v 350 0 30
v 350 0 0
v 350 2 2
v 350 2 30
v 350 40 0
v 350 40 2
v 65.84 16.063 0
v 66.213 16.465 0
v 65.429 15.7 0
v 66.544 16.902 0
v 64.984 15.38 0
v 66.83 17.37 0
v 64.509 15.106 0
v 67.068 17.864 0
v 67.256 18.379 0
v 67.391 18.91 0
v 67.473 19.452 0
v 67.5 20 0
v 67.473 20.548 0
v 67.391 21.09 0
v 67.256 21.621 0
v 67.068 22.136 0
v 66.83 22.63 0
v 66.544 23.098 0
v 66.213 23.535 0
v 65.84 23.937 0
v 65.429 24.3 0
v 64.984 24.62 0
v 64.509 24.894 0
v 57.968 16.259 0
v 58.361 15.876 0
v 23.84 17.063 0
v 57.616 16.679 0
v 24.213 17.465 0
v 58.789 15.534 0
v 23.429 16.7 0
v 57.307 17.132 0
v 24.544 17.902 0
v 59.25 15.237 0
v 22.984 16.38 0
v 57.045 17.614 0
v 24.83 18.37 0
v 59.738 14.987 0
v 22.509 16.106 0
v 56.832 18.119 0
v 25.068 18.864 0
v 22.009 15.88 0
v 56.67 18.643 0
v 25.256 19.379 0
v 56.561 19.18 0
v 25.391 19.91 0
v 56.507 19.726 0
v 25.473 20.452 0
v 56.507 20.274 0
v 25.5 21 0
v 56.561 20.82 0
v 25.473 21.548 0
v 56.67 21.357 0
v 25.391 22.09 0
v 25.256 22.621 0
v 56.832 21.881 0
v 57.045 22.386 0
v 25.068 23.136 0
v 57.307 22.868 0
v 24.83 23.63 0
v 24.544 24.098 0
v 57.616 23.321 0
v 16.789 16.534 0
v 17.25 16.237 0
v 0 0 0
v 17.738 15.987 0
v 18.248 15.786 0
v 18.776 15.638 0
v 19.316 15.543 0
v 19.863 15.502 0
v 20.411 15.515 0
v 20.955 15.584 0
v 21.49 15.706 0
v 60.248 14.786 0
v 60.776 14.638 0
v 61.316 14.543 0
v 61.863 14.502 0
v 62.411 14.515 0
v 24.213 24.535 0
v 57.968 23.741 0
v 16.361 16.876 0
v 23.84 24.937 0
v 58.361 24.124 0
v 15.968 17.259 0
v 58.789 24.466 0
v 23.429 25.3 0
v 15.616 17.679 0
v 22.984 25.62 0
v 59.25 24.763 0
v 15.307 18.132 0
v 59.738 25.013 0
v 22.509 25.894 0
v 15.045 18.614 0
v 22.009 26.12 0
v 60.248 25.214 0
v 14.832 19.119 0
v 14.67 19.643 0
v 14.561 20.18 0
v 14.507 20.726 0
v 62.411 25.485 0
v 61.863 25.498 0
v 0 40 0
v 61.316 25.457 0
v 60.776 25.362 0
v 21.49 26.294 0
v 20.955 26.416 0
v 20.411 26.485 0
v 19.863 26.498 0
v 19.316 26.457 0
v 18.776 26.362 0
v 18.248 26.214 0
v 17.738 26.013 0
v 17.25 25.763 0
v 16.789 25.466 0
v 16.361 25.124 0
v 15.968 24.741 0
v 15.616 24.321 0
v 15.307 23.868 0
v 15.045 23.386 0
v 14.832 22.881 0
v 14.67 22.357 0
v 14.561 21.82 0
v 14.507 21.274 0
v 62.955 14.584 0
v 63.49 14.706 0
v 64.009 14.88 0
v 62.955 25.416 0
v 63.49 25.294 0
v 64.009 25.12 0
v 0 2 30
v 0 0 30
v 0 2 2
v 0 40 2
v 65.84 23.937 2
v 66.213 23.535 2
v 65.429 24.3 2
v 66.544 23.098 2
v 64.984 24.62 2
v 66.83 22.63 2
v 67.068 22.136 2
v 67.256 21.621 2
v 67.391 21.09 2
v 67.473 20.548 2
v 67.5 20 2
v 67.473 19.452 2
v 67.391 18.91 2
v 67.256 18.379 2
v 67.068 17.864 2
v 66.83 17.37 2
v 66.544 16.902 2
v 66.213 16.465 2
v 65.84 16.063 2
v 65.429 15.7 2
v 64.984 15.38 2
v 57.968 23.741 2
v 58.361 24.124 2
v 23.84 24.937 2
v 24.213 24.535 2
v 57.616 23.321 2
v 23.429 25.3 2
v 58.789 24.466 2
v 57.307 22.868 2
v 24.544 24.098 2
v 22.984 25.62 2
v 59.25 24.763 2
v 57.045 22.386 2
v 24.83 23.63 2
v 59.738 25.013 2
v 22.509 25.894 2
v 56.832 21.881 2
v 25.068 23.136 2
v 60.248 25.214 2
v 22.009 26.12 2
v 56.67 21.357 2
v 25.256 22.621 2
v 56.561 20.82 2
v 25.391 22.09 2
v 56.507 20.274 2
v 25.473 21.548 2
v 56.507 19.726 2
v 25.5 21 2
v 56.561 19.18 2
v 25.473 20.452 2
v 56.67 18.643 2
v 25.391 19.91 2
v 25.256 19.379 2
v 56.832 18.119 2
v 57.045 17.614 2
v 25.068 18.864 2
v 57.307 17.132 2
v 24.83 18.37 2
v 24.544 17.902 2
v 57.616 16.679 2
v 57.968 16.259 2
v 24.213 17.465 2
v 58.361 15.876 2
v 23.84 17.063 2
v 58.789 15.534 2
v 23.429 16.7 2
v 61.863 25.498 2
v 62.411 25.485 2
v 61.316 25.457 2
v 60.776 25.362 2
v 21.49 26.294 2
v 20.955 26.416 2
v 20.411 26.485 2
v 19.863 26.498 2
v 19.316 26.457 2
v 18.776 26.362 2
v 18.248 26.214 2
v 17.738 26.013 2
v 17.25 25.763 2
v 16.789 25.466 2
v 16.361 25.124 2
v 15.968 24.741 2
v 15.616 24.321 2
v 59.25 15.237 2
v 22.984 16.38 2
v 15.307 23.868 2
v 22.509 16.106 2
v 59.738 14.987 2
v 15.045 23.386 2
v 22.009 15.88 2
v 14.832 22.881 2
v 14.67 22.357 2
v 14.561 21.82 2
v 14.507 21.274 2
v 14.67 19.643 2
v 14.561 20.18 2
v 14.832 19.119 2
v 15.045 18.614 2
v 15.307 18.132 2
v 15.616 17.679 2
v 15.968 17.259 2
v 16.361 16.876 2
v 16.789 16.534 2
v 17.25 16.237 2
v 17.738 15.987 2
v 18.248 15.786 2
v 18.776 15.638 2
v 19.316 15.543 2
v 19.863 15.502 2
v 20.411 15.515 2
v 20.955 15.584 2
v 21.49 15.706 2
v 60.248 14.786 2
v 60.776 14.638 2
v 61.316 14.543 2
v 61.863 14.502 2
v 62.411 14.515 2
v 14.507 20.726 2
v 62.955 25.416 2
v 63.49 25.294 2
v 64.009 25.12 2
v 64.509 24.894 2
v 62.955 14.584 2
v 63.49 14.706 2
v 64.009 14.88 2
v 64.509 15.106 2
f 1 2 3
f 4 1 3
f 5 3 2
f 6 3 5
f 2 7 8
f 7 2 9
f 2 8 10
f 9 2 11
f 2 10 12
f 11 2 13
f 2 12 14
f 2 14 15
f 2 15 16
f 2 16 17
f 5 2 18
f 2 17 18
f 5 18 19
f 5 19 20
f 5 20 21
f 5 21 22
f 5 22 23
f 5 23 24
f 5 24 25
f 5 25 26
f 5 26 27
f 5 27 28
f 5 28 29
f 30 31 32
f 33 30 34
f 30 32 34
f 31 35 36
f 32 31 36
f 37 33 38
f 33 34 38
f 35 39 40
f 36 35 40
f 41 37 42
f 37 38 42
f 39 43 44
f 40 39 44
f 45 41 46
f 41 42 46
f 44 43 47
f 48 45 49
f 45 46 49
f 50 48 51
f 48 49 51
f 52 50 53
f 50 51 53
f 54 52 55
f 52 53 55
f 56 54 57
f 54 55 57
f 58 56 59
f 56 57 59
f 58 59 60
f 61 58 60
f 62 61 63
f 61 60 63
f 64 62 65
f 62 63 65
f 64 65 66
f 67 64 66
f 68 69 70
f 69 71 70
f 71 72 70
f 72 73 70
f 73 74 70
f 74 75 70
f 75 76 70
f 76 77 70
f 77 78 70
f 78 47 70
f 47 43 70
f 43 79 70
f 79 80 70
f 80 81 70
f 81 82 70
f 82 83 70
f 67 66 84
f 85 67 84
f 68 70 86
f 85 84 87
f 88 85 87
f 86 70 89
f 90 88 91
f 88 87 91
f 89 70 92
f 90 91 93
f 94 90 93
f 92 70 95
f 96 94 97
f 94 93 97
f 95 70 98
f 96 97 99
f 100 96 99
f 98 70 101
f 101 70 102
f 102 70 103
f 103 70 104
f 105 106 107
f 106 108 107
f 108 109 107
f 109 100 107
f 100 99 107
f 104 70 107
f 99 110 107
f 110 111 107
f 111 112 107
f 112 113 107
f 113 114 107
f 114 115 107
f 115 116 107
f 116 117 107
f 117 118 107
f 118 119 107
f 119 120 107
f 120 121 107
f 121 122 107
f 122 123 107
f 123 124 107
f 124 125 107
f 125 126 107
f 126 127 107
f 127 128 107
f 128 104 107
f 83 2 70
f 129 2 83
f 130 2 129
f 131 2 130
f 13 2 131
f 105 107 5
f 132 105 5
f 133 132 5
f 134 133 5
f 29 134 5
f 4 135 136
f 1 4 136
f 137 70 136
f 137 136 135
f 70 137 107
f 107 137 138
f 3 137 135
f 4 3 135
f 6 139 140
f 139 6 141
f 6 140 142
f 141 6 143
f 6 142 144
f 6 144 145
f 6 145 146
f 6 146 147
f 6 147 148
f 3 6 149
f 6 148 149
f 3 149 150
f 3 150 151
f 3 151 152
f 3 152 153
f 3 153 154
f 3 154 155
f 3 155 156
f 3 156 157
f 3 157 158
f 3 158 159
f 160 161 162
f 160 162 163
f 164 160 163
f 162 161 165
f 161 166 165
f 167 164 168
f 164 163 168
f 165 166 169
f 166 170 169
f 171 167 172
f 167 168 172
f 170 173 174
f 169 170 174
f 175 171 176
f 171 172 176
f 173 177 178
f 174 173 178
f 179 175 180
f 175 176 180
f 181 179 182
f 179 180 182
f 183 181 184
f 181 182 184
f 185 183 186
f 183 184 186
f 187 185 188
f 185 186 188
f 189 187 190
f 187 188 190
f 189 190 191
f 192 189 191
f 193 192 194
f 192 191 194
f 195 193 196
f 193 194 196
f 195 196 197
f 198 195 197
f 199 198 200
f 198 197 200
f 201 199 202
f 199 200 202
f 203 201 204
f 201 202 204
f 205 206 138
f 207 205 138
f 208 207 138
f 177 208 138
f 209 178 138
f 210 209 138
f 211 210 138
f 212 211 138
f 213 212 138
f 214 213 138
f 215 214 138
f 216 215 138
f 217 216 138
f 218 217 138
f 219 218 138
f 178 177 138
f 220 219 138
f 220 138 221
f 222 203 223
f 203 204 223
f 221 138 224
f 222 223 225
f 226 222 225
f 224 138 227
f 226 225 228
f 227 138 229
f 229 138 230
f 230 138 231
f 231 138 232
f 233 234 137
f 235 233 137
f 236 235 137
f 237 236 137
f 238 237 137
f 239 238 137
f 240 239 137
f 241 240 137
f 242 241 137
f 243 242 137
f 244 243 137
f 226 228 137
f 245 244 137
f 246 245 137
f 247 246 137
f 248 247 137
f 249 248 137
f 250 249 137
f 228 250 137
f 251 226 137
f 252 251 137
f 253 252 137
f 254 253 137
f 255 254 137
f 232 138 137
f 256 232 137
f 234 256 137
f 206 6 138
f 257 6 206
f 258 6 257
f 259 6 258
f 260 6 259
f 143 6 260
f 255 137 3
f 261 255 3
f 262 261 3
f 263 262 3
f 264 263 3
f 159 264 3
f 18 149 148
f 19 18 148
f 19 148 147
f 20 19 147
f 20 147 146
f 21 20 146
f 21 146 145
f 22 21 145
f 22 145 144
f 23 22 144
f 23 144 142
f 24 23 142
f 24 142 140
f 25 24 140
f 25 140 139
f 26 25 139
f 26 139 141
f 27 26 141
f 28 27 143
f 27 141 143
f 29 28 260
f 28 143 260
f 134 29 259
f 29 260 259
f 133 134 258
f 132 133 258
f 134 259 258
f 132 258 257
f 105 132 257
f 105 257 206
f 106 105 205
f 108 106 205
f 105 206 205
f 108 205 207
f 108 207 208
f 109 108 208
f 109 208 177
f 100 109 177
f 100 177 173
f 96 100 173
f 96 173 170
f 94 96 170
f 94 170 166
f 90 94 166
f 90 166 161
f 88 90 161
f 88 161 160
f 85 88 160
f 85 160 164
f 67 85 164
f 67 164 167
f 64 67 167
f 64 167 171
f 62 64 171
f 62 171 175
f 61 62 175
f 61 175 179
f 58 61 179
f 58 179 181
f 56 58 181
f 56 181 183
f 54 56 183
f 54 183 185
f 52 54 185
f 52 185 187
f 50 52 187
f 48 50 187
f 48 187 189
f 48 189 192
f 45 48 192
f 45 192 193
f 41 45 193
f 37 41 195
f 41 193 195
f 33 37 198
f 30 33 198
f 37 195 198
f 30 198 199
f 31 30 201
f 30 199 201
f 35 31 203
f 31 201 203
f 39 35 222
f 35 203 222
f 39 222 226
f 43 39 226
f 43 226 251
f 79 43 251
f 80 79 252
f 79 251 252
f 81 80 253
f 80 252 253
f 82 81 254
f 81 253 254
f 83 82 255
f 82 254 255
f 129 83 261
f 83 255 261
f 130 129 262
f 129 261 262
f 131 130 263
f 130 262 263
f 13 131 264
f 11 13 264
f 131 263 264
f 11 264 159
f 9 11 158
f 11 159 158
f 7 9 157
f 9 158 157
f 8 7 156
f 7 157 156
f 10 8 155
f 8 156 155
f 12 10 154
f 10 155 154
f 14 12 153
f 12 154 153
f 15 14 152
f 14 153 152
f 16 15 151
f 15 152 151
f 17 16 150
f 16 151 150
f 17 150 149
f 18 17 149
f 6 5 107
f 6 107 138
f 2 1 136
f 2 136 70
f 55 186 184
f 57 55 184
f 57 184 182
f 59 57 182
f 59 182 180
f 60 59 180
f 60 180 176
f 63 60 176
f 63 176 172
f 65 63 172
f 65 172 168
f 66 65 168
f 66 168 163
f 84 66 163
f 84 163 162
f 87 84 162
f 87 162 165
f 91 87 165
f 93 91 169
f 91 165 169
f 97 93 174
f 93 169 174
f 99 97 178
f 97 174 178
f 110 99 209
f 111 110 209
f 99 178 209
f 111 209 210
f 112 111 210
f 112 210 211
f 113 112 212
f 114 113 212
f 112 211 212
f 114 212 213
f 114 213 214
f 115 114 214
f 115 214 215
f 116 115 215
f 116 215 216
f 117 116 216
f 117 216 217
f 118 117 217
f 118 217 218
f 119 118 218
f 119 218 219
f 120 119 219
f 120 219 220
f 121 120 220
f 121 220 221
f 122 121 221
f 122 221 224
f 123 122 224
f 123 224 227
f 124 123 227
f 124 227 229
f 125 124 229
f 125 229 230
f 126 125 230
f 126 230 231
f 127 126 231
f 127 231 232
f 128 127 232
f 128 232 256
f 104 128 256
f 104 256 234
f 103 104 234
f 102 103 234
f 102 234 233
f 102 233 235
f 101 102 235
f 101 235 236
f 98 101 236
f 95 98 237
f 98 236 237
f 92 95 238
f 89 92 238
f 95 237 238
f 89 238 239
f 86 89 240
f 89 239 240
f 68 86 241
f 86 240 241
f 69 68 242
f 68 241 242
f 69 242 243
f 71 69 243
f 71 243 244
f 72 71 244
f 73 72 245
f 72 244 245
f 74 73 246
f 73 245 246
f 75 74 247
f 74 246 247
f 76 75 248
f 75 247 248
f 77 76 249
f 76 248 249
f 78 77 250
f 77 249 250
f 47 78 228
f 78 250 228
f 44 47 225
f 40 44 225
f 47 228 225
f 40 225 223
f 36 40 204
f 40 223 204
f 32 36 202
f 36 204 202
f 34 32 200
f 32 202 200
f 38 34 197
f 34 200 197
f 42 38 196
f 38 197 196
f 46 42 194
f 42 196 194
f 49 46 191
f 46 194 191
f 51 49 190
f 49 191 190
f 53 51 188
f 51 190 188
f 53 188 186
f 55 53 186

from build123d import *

# Parameters (mm, degrees)
F1_DEPTH = 350
F2_R     = 5.5
F3_DEPTH = 25


with BuildPart() as f1:
    # F0 (on Right) → F1 (new body)
    with BuildSketch(Plane.YZ):
        Polygon((0, 30), (0, 0), (40, 0), (40, 2), (2, 2), (2, 30), align=None)
    extrude(amount=F1_DEPTH)

    # F2 (on face) → F3 (cut)
    with BuildSketch(Plane.XY.offset(2)):
        with Locations((20, 21)):
            Circle(F2_R)
        with Locations((62, 20)):
            Circle(F2_R)
    extrude(amount=-F3_DEPTH, mode=Mode.SUBTRACT)


solid = f1.part
